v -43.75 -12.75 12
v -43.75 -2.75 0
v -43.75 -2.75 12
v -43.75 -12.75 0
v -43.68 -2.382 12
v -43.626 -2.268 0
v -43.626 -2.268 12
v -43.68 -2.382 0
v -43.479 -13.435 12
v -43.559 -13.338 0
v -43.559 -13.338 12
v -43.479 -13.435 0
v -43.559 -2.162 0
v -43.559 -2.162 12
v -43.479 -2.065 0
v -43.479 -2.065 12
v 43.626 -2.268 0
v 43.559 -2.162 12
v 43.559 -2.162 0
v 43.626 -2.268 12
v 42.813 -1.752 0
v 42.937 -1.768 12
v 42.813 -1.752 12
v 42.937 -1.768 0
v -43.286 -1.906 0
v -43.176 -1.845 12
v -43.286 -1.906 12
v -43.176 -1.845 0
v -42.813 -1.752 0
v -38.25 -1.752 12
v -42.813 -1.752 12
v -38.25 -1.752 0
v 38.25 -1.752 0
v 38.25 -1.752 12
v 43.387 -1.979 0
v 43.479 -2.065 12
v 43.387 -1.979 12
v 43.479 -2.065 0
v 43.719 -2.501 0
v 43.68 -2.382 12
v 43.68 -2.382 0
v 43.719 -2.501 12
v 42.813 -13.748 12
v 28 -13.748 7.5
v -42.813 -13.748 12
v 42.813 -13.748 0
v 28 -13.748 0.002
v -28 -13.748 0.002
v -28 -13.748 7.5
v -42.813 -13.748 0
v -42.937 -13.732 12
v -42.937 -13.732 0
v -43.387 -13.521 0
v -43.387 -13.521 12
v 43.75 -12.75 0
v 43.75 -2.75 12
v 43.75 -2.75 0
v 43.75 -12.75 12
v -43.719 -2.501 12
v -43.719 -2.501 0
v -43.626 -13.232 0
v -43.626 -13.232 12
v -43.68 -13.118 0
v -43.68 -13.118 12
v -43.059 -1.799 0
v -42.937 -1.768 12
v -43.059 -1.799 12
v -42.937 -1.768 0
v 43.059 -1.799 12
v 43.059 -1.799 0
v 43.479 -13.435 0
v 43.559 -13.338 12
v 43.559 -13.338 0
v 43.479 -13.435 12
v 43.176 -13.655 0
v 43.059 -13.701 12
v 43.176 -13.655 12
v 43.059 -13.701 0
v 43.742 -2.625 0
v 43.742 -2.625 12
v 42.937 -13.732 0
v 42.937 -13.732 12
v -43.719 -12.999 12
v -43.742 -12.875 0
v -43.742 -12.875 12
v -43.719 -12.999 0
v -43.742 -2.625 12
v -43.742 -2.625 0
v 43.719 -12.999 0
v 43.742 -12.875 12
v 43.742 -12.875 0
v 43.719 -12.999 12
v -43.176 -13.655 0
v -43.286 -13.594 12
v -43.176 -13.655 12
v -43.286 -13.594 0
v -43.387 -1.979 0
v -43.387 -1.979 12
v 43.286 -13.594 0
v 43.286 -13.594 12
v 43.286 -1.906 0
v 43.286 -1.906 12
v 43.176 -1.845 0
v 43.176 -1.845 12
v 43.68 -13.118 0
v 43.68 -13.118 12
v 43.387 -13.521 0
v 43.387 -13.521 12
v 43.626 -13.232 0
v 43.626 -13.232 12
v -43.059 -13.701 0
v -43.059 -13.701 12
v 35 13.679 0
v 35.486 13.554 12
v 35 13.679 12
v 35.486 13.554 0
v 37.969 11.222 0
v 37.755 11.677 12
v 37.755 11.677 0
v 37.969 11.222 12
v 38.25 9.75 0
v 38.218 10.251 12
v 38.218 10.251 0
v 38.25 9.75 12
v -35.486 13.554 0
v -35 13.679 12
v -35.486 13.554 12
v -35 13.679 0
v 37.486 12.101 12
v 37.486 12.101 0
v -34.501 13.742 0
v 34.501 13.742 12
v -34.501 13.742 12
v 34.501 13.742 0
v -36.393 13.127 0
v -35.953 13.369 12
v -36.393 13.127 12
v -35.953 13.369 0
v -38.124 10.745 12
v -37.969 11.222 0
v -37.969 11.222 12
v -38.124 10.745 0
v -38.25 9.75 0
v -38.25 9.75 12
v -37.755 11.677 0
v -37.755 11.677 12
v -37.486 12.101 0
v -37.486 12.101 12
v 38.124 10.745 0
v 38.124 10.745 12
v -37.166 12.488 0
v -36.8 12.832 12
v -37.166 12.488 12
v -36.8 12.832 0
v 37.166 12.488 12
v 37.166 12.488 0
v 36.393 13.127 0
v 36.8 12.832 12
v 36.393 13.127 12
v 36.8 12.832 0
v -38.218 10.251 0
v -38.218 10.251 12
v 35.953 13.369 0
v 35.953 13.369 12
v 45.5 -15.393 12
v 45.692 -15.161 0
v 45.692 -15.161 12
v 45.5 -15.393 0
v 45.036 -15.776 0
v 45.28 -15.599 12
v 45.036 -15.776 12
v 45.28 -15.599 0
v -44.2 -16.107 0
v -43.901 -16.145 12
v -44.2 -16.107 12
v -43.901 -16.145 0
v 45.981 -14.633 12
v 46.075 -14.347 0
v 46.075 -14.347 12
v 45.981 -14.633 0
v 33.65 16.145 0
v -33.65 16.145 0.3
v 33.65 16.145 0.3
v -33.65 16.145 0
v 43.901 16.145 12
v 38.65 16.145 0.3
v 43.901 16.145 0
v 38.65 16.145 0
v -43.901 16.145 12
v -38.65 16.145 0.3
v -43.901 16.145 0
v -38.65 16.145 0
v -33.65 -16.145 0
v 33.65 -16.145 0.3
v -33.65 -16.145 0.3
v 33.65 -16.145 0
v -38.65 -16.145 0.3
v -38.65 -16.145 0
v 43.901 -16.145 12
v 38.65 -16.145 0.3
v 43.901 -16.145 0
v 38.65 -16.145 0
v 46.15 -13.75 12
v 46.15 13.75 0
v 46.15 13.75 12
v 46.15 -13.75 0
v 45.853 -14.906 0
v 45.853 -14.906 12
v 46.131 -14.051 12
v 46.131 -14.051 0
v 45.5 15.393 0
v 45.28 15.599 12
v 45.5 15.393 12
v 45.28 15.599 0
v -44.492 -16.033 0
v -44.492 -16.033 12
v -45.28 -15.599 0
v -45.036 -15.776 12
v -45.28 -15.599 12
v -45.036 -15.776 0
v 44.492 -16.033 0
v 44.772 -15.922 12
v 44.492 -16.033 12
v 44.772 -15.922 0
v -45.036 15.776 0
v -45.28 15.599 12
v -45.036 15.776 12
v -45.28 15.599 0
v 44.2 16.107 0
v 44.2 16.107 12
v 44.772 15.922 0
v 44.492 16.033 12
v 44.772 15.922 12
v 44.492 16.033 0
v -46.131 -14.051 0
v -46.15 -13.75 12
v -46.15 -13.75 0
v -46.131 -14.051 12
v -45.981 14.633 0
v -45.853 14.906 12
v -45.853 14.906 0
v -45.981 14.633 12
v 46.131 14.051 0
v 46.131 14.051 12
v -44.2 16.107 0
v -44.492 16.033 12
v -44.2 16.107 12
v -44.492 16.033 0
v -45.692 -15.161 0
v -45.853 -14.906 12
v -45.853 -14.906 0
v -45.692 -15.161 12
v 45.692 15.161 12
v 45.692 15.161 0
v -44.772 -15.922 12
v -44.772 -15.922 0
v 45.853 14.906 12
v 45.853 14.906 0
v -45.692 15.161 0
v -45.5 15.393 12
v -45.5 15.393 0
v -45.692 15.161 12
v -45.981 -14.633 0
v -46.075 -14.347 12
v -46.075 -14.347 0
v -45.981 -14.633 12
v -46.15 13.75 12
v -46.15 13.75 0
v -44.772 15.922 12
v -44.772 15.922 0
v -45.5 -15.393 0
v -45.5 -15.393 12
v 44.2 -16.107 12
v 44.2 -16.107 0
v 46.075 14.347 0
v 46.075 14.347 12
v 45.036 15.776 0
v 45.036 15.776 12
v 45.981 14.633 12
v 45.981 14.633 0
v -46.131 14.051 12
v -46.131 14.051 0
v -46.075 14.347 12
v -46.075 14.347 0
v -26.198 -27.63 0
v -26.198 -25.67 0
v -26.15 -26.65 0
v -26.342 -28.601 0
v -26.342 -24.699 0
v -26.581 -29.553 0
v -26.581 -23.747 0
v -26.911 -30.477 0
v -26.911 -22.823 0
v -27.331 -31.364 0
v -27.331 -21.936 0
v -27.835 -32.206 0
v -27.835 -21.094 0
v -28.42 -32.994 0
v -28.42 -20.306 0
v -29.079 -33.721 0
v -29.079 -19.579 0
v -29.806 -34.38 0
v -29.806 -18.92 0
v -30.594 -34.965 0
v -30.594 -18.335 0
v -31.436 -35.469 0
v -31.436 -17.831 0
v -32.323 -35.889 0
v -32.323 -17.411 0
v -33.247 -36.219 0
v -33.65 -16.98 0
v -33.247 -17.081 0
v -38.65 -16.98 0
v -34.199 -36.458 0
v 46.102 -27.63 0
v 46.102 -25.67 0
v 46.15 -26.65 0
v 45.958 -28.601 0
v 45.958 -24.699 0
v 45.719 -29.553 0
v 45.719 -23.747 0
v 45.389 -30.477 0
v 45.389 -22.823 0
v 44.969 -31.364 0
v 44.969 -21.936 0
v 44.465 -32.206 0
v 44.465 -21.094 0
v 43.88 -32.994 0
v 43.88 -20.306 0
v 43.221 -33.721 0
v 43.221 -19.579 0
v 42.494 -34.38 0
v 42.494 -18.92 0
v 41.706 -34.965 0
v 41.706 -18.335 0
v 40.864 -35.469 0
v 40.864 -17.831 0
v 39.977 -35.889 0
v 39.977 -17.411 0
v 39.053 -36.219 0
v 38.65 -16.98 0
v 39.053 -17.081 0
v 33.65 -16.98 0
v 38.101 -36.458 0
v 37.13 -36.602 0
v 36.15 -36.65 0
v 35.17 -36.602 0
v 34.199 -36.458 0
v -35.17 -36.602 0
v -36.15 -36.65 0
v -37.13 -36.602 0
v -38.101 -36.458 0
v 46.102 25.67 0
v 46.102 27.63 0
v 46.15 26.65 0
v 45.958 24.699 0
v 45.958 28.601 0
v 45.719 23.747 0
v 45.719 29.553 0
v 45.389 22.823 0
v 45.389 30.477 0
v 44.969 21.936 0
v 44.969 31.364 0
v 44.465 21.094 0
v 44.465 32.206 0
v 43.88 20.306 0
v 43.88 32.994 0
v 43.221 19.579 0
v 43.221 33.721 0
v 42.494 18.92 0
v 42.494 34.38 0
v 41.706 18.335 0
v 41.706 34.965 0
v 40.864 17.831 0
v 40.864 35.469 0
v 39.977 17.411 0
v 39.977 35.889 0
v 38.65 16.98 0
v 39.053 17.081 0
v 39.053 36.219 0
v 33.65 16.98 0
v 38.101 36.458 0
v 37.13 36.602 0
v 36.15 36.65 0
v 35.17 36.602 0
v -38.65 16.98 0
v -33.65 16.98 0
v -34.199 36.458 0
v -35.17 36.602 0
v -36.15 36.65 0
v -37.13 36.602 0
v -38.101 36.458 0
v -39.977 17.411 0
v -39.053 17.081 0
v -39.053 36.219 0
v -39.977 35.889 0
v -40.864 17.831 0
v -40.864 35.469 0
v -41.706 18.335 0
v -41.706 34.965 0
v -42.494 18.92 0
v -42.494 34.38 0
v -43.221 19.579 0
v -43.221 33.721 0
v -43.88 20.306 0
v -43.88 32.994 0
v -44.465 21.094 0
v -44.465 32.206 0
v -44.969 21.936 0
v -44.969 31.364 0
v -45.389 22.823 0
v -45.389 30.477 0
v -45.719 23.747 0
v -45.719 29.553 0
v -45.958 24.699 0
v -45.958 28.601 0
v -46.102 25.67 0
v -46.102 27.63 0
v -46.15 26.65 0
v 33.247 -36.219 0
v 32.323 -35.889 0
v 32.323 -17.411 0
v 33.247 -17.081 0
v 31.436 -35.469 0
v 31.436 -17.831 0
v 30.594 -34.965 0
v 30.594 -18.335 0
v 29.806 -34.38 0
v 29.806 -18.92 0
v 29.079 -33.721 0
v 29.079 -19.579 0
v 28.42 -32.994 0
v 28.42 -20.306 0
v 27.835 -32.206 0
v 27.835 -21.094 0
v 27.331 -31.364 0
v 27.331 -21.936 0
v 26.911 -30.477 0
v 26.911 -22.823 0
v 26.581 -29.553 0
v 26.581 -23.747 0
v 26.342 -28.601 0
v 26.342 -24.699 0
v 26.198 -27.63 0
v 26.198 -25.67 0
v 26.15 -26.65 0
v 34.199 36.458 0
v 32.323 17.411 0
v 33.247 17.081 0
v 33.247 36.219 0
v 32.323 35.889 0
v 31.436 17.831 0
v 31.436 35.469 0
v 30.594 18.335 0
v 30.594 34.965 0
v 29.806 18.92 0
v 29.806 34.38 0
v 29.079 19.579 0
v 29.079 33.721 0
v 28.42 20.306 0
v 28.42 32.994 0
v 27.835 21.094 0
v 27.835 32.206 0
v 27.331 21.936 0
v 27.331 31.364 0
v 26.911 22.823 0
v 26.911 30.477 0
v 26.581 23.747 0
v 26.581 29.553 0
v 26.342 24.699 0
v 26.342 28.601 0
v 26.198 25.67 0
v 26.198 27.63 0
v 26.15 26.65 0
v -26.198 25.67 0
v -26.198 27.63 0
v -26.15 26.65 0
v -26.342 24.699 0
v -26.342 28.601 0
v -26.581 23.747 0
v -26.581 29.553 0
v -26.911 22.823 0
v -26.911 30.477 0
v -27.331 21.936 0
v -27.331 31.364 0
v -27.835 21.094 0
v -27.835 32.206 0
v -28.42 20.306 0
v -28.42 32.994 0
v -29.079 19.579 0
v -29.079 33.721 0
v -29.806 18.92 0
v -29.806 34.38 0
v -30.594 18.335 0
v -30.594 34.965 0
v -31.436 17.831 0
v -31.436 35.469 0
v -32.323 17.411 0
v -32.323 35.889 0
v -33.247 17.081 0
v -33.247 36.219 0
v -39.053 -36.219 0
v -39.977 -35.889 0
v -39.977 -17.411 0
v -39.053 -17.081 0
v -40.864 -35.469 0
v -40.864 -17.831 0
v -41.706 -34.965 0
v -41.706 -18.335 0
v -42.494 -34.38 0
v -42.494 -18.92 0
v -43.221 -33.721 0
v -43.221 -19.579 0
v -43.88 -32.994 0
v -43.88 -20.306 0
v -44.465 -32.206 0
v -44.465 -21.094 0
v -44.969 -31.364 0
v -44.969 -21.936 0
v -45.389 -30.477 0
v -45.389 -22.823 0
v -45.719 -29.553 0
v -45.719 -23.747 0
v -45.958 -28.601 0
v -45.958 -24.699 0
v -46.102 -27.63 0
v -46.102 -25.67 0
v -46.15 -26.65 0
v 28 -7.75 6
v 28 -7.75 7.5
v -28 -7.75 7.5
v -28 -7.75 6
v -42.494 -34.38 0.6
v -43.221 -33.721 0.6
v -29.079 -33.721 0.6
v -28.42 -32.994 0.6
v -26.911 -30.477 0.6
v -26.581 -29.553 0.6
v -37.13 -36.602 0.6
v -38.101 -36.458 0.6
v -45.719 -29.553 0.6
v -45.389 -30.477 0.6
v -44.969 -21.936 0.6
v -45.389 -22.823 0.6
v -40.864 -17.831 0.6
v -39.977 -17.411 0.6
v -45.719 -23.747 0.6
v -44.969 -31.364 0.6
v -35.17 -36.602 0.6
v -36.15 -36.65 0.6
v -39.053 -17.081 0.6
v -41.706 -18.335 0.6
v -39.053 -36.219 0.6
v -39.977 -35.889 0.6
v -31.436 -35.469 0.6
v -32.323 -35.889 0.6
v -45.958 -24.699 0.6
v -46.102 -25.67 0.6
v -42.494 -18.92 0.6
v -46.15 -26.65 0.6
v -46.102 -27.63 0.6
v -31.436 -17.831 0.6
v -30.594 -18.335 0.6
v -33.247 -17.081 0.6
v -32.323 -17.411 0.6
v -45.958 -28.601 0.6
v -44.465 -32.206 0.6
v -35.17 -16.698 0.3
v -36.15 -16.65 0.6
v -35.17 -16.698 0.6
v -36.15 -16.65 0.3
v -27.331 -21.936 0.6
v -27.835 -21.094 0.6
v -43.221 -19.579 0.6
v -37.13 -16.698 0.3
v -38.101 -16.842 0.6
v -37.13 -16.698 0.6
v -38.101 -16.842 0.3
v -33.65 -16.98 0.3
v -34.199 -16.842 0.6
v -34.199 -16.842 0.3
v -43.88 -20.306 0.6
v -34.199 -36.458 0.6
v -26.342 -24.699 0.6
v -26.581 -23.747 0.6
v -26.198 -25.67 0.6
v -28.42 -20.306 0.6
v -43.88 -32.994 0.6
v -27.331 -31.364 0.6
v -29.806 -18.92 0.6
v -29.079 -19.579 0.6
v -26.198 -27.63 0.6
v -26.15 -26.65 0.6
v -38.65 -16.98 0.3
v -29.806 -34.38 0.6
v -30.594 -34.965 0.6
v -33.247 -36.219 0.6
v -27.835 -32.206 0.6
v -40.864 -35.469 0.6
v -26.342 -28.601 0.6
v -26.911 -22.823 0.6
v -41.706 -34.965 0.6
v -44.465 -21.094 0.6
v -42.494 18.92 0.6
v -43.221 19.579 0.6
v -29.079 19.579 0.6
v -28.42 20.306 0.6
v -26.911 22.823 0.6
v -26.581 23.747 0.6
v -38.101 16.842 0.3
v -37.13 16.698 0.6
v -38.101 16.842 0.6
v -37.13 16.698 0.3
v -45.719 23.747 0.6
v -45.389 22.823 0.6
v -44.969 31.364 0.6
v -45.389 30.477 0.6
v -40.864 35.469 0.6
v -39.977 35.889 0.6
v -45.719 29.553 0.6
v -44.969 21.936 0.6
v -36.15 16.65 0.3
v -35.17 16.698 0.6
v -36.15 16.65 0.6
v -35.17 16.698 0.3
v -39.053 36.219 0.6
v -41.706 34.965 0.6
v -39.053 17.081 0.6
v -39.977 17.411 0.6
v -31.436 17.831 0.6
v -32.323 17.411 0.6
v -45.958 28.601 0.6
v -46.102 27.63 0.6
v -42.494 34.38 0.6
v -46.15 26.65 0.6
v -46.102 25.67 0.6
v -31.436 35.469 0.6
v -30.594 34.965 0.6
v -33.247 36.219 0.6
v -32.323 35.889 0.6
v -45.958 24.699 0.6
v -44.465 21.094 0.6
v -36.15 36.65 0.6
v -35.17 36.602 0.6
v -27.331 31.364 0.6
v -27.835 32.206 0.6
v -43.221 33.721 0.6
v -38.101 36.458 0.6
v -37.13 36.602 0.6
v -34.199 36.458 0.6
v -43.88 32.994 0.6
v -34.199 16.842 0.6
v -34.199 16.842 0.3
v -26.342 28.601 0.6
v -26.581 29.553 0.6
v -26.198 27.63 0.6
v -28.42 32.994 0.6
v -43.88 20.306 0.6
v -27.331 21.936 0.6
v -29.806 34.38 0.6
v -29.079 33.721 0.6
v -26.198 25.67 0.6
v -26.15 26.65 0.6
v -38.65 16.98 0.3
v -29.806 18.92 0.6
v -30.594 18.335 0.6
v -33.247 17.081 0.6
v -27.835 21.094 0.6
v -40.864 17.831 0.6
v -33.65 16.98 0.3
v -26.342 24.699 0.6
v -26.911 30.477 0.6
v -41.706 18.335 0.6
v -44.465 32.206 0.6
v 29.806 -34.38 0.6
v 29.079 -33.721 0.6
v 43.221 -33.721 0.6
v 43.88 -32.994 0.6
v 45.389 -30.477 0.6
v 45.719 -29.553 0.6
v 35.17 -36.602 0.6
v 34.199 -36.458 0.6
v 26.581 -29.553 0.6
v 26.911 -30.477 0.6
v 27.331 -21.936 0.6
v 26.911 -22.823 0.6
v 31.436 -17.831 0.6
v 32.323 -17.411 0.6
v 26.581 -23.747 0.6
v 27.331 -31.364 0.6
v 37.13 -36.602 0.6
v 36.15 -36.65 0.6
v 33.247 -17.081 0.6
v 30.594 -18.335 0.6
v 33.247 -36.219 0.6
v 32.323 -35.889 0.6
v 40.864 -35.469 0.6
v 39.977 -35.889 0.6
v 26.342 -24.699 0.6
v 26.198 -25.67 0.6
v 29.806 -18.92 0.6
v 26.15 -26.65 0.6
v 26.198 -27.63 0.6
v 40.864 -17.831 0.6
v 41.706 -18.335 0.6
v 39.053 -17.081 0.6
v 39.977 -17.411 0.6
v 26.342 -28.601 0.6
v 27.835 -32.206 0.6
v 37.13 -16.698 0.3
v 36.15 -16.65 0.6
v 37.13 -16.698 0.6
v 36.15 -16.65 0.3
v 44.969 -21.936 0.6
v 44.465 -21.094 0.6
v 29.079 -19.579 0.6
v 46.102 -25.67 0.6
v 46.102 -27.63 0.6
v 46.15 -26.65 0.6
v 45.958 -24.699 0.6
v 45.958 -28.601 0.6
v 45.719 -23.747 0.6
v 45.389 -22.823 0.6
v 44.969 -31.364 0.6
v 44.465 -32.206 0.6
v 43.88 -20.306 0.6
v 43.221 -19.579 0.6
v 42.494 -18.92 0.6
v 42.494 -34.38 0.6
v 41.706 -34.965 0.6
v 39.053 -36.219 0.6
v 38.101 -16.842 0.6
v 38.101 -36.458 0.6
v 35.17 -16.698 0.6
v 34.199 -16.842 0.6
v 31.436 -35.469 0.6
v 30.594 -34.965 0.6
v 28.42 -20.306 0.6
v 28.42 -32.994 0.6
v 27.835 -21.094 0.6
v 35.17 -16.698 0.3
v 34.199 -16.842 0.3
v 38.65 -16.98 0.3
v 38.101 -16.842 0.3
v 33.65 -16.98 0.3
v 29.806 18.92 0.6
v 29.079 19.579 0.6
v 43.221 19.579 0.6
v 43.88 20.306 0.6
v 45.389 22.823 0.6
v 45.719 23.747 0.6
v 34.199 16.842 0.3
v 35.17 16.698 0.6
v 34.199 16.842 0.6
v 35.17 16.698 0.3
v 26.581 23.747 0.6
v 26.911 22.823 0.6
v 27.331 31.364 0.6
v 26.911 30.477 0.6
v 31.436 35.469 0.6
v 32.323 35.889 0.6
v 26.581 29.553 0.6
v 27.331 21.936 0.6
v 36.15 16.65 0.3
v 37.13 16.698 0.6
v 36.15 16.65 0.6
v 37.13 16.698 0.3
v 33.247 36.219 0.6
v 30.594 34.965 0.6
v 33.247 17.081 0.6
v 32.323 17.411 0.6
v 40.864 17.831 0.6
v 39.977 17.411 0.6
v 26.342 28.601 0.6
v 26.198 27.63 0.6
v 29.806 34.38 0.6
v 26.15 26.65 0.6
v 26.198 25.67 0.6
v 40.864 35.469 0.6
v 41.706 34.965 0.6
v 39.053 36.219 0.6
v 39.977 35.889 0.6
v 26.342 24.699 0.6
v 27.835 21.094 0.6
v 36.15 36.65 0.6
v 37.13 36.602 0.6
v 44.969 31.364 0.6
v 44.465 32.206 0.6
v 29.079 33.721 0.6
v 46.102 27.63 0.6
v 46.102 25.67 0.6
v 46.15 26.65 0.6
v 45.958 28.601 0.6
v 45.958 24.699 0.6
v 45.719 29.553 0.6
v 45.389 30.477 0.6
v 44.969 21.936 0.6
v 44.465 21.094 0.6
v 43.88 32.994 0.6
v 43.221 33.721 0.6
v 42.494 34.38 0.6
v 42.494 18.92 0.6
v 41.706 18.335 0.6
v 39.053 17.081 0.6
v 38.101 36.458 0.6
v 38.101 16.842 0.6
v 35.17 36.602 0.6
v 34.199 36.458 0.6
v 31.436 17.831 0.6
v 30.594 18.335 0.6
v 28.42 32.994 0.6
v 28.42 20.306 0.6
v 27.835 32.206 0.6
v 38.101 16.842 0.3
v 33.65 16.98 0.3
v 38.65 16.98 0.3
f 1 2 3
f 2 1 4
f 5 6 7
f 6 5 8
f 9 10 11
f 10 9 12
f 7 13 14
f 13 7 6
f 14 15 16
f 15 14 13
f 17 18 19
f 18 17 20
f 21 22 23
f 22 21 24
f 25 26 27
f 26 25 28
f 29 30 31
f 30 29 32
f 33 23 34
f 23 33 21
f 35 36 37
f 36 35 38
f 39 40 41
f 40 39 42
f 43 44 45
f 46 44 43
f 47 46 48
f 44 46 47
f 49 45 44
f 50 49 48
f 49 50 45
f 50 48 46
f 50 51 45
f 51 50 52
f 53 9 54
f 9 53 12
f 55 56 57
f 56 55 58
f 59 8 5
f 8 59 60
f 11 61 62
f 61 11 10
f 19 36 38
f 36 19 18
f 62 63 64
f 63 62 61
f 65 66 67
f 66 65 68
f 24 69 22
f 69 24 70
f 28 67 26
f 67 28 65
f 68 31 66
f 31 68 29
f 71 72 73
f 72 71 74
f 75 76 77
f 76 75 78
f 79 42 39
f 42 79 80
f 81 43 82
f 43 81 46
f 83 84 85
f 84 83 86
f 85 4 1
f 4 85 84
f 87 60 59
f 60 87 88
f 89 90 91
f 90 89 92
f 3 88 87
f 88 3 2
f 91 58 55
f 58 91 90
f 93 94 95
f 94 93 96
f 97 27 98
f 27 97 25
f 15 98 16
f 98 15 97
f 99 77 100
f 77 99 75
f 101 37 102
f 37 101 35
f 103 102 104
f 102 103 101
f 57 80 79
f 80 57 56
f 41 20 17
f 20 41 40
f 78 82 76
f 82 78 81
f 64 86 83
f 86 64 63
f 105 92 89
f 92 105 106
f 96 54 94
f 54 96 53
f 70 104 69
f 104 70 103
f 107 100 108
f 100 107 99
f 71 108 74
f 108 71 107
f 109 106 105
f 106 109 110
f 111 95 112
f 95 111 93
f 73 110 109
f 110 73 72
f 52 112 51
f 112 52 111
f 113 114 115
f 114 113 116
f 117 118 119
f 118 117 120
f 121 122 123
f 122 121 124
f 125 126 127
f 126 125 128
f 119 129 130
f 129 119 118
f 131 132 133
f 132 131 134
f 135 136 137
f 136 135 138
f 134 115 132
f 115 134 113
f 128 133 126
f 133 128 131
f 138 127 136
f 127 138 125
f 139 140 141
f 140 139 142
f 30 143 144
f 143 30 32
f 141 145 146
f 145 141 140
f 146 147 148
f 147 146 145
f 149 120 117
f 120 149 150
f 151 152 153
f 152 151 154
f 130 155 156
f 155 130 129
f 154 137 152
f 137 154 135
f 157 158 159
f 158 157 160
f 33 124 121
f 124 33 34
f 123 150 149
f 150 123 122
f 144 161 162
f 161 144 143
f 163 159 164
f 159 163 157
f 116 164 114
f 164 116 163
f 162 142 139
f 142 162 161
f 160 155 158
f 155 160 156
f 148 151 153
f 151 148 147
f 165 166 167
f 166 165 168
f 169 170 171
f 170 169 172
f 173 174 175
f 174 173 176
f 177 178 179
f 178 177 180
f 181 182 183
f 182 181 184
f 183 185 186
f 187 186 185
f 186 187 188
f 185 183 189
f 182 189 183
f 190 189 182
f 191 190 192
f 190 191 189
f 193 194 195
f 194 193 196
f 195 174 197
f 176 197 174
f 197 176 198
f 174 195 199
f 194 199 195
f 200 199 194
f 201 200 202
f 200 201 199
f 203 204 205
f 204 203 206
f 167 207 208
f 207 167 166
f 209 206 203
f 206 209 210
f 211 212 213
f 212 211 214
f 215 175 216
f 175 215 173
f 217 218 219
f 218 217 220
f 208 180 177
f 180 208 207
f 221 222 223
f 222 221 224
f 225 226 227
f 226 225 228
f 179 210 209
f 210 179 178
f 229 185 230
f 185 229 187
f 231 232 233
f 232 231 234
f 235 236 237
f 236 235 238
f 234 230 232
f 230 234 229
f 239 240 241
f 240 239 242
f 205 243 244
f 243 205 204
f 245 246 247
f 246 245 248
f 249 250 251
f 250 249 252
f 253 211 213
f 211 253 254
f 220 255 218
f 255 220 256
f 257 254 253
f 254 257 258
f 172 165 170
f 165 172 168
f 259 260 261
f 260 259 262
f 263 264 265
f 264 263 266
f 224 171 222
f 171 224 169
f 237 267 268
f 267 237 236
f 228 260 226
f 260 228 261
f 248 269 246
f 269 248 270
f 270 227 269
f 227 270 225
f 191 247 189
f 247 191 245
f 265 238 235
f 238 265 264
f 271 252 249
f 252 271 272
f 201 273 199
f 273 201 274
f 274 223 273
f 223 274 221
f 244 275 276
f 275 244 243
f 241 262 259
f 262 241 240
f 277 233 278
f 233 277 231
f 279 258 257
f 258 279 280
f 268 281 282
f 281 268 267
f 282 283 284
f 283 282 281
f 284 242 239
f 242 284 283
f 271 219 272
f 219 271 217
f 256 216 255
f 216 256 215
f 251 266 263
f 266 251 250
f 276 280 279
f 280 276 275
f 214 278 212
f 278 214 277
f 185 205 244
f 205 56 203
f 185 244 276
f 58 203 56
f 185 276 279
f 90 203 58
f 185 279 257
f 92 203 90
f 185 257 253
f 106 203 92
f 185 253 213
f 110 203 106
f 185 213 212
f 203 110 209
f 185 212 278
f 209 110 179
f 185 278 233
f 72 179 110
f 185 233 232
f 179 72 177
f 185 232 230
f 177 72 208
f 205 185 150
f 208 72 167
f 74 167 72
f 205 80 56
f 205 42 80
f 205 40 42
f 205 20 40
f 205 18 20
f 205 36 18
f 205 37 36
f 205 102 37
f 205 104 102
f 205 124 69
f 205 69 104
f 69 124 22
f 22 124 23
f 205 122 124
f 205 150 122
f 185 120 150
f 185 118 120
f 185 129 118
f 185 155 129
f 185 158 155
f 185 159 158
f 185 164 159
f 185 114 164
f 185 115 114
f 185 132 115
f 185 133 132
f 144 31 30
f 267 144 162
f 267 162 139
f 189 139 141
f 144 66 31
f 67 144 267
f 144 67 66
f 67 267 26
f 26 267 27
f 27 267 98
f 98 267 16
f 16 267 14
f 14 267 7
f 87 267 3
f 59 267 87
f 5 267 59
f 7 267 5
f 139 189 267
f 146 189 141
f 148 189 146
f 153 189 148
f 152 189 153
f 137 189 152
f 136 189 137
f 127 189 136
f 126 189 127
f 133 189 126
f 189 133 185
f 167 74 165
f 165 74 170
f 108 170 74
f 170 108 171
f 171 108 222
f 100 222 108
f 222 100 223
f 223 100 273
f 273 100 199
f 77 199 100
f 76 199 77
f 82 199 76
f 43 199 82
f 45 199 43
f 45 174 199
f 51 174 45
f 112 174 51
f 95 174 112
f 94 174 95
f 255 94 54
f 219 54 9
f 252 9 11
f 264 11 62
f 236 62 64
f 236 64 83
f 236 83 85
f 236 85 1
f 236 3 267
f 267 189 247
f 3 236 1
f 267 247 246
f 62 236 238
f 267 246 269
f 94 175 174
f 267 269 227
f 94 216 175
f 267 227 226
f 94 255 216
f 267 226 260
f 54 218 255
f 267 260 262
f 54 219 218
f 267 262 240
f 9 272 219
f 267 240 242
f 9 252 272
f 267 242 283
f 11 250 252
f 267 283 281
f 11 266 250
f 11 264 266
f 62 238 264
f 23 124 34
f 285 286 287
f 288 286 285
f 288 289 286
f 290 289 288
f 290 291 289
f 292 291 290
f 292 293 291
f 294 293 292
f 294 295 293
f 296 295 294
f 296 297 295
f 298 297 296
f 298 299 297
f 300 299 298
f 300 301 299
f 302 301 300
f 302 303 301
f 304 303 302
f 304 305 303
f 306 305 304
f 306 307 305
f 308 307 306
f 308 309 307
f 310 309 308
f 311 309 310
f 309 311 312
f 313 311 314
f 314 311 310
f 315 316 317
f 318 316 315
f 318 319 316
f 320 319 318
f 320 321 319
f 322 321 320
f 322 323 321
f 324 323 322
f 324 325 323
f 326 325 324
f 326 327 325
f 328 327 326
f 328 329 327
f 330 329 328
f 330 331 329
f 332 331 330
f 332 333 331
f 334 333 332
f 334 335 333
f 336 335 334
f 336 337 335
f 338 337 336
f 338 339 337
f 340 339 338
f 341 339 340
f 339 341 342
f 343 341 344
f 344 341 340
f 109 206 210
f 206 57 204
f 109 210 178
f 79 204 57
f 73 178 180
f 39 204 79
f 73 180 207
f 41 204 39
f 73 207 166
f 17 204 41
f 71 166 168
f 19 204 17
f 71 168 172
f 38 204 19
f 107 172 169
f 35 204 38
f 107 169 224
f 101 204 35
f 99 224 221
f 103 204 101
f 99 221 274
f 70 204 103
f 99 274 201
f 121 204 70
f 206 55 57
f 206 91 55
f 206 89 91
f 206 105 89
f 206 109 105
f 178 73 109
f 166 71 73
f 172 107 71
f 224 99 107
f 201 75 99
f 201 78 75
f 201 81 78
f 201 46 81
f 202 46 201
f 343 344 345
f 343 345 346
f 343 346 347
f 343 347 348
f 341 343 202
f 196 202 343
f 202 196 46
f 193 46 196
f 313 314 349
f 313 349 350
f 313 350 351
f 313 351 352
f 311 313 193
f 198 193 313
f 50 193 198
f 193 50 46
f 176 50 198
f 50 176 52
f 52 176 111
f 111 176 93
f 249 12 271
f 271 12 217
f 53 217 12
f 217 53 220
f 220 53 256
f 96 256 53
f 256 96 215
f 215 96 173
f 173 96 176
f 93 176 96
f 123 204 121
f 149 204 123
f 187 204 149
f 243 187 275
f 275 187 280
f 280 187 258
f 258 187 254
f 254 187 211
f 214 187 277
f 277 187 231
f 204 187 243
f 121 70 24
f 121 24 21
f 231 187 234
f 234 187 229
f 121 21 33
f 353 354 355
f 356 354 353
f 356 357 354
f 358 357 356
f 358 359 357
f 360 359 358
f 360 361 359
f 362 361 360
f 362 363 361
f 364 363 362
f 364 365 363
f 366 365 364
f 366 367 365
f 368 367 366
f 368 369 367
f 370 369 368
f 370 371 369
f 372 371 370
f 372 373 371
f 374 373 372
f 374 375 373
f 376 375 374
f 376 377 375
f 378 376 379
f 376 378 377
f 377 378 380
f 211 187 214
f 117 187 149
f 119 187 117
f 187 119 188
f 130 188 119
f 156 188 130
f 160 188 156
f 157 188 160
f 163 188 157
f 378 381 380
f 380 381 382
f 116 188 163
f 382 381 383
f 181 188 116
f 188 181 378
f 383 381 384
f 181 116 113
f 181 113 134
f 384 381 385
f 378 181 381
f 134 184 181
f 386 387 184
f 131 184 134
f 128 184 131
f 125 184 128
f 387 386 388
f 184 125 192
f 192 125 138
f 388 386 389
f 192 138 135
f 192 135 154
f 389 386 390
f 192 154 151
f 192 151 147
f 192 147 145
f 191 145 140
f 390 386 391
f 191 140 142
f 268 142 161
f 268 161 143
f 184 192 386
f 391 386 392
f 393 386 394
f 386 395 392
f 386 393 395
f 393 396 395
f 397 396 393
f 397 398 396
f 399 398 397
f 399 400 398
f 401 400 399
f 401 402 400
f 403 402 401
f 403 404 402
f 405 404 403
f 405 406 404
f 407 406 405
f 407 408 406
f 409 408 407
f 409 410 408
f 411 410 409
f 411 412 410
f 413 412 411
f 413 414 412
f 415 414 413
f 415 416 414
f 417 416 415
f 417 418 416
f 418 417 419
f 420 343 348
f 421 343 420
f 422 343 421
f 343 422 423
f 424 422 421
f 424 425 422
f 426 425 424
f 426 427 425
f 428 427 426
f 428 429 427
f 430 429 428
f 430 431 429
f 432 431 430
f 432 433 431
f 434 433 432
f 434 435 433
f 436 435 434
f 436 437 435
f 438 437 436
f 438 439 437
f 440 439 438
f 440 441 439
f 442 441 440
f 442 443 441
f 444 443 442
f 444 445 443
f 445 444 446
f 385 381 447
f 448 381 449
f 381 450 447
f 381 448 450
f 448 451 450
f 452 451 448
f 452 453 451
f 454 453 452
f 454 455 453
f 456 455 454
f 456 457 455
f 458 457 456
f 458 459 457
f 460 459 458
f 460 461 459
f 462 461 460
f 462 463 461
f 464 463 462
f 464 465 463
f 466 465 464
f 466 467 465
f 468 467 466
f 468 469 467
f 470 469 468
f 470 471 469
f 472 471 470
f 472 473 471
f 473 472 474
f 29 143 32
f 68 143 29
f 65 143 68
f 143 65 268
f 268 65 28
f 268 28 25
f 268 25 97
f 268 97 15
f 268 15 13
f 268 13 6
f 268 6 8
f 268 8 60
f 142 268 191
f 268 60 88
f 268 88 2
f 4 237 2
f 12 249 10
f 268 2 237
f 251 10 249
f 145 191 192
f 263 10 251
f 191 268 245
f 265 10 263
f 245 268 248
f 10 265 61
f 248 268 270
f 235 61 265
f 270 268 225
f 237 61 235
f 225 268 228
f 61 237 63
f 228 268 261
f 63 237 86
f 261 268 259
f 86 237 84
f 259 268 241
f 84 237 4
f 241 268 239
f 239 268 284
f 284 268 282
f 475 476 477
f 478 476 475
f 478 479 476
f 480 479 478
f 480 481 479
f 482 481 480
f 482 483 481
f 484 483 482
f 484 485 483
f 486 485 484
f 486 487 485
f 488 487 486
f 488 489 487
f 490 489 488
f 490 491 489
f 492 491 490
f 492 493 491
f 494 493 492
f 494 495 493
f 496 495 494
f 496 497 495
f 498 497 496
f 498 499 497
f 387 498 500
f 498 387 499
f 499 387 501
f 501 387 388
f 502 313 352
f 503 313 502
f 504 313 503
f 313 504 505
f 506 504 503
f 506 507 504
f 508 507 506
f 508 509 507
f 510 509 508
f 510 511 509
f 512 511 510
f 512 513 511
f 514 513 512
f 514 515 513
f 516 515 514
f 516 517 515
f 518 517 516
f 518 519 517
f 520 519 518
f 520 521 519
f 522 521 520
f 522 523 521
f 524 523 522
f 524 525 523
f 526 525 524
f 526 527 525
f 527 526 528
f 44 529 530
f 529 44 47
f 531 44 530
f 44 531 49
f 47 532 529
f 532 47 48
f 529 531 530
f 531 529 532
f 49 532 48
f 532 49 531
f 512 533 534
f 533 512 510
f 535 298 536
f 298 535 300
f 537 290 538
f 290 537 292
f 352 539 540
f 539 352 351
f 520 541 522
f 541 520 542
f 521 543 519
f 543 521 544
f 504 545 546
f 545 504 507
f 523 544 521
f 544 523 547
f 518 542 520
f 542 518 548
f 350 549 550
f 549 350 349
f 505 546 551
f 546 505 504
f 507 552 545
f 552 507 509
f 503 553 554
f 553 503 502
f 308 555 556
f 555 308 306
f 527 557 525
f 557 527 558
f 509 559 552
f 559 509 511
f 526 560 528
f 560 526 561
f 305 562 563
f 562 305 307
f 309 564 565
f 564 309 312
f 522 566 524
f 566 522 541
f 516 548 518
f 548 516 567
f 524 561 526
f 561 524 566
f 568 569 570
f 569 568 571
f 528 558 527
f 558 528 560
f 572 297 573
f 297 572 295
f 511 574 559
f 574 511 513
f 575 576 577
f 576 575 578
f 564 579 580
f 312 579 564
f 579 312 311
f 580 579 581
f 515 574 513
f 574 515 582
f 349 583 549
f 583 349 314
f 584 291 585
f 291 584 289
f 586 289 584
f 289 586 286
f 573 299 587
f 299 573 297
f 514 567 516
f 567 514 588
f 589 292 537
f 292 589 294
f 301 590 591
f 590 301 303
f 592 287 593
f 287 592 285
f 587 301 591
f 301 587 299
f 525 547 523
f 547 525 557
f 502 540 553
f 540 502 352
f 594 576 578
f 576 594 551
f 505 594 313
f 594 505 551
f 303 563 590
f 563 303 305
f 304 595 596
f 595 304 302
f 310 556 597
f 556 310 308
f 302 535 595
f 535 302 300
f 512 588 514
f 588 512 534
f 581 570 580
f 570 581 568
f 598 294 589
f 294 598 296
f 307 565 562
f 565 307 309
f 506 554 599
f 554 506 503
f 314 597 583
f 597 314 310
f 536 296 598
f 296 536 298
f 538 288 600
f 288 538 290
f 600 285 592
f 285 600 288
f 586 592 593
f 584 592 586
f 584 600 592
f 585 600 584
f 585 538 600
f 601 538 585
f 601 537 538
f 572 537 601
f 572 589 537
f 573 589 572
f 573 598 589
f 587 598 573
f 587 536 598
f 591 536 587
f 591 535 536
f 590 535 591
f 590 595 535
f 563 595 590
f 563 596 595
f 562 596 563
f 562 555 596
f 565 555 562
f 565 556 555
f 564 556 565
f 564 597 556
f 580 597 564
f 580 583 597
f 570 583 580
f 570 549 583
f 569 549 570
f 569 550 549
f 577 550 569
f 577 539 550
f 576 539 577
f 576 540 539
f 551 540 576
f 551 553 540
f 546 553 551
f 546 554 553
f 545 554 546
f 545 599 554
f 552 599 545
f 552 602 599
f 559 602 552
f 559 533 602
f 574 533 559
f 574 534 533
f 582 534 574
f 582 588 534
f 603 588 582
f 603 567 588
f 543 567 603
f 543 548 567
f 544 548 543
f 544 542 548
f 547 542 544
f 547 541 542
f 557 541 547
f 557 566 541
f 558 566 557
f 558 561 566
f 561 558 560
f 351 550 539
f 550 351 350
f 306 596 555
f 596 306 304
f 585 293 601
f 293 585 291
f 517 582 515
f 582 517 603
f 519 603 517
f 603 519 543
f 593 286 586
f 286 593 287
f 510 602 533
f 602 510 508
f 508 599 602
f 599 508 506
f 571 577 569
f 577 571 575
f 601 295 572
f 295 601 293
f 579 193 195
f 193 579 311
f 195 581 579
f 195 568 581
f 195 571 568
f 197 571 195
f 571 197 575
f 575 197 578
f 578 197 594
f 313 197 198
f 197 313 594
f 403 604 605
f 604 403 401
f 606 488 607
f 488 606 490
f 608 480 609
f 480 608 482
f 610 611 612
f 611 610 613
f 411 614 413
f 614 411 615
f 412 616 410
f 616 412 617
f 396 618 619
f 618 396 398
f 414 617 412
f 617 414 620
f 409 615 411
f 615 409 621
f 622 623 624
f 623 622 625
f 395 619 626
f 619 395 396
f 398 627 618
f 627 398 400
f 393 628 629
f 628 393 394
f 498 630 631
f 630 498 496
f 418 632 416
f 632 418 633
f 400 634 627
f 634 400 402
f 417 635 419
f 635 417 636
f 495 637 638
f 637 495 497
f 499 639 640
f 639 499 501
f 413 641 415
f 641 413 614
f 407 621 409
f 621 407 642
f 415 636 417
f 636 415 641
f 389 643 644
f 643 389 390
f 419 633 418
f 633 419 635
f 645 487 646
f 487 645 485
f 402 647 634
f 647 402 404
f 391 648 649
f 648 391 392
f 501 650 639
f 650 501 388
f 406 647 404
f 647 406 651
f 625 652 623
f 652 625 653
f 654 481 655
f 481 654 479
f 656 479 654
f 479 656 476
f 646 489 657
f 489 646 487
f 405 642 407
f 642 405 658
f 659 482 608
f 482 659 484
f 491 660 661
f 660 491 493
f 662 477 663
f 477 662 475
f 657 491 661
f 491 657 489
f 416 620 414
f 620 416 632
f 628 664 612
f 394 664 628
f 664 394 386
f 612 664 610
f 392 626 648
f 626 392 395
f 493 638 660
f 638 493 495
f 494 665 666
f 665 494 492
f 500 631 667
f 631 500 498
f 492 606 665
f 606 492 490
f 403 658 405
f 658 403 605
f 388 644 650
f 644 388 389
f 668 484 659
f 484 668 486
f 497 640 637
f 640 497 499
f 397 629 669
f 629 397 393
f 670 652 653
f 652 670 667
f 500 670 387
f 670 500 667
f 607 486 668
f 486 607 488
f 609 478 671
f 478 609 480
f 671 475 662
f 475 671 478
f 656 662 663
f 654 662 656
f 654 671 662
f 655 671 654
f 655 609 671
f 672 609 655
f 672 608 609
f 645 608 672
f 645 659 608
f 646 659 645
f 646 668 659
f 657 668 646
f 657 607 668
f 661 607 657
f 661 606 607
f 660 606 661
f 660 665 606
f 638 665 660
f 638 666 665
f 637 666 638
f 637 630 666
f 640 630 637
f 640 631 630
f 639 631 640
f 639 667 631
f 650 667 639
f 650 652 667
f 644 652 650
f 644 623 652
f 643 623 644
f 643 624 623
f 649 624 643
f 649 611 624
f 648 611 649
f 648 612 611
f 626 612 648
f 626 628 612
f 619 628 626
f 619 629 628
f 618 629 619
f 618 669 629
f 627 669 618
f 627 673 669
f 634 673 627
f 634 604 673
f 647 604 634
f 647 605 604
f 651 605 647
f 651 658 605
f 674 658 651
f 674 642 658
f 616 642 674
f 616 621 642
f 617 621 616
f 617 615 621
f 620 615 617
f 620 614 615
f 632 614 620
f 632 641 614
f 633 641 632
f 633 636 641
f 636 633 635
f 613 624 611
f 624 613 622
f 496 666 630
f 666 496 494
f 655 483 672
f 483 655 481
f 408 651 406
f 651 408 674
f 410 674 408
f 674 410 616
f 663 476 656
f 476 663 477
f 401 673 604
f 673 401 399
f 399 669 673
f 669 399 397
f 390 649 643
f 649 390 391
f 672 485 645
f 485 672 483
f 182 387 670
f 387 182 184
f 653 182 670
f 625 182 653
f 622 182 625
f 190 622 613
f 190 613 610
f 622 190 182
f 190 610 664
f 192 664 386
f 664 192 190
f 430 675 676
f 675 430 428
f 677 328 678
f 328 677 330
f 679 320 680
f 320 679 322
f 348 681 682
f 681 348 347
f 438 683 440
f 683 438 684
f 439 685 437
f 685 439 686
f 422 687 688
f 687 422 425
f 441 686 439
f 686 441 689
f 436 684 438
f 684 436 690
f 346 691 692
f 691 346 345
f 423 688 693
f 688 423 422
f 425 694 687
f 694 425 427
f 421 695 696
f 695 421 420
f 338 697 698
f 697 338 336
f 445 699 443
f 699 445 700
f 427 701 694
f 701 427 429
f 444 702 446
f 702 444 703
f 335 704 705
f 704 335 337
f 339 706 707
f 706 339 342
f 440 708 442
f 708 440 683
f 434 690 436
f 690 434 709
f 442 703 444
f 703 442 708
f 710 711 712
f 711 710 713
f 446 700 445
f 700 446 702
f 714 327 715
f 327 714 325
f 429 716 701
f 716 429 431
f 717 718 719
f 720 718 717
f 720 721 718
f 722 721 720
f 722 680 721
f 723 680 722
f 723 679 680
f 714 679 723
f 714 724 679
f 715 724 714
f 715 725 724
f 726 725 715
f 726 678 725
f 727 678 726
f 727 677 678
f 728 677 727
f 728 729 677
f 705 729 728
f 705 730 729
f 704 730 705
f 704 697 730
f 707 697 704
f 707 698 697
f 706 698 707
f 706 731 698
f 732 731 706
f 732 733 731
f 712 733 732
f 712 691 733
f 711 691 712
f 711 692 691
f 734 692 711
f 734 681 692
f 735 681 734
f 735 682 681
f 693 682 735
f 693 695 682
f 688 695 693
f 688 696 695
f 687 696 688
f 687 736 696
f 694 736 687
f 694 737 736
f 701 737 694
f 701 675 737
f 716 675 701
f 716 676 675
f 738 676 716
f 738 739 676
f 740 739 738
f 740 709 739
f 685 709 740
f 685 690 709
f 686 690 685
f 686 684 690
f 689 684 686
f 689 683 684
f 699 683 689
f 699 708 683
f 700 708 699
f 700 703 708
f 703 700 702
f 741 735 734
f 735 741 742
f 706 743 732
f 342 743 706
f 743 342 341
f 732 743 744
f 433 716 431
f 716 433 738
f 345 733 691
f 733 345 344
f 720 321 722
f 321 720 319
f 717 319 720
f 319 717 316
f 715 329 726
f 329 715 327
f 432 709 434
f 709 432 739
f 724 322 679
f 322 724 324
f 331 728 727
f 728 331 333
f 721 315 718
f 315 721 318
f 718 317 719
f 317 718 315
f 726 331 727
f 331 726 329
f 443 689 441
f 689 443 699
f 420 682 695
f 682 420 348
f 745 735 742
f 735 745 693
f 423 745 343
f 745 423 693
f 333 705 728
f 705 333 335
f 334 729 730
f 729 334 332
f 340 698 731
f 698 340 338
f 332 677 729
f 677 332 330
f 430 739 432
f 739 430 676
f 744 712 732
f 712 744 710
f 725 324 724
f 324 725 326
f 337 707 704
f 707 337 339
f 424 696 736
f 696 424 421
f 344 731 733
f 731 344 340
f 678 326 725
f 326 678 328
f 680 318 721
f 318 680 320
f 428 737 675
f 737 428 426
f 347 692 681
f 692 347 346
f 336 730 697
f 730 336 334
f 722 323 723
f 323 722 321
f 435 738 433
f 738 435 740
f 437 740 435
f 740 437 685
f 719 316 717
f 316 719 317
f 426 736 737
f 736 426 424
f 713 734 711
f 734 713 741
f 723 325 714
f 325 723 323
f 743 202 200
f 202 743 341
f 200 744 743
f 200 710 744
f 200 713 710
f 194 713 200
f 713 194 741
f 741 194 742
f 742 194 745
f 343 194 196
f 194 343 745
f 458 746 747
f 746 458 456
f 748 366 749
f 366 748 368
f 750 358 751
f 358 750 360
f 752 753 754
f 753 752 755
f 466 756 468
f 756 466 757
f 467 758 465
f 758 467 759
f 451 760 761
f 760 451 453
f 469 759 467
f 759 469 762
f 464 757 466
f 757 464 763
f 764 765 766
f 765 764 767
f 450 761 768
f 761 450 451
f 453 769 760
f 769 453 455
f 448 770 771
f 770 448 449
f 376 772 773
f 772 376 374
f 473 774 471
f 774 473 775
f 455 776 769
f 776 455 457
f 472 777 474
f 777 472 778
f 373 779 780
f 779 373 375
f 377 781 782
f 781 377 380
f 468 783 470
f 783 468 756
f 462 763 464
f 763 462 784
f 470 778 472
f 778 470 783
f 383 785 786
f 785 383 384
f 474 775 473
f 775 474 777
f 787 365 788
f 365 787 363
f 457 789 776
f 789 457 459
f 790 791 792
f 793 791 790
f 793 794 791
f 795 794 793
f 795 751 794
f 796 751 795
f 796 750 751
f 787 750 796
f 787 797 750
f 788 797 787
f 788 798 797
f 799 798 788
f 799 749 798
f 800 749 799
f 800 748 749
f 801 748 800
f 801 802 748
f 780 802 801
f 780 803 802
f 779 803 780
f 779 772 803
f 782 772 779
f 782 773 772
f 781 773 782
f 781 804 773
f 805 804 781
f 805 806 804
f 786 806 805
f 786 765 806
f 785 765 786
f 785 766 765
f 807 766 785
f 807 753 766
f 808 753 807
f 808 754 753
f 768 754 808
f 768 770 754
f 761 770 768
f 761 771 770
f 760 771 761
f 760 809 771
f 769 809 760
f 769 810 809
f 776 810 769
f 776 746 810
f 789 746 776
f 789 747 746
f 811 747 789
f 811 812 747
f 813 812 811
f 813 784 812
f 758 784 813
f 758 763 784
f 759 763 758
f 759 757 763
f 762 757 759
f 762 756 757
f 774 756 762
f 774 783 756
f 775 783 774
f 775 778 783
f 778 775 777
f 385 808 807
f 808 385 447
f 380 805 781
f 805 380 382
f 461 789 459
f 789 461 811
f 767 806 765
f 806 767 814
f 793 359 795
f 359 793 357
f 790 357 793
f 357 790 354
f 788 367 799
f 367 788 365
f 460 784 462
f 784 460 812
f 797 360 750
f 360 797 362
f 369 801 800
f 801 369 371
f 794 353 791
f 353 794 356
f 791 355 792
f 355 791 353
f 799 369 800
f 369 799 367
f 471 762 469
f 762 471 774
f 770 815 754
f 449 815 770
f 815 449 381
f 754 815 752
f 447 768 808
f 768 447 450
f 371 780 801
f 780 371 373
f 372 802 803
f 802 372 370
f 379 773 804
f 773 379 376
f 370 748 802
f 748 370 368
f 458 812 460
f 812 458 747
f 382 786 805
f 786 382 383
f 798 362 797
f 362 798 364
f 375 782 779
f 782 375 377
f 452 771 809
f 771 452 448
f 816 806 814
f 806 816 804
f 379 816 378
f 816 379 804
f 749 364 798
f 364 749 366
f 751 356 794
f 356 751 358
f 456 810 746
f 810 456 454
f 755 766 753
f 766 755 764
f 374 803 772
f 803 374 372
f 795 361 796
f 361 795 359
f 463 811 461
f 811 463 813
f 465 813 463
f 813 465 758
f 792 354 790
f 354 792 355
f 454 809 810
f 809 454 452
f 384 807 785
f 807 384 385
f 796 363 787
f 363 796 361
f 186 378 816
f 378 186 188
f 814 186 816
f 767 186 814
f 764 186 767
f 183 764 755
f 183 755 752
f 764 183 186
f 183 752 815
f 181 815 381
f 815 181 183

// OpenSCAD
$fn = 50;

union() {
	difference() {
		union() {
			hull() {
				translate(v = [-43.75, 13.749999999999998, 0]) {
					cylinder(h = 12, r = 2.4);
				}
				translate(v = [43.75, 13.749999999999998, 0]) {
					cylinder(h = 12, r = 2.4);
				}
				translate(v = [-43.75, -13.749999999999998, 0]) {
					cylinder(h = 12, r = 2.4);
				}
				translate(v = [43.75, -13.749999999999998, 0]) {
					cylinder(h = 12, r = 2.4);
				}
			}
		}
		union() {
			translate(v = [0.0, -7.749999999999998, -0.1]) {
				hull() {
					translate(v = [-42.75, 5.0, 0]) {
						cylinder(h = 12.2, r = 1.0);
					}
					translate(v = [42.75, 5.0, 0]) {
						cylinder(h = 12.2, r = 1.0);
					}
					translate(v = [-42.75, -5.0, 0]) {
						cylinder(h = 12.2, r = 1.0);
					}
					translate(v = [42.75, -5.0, 0]) {
						cylinder(h = 12.2, r = 1.0);
					}
				}
			}
			translate(v = [0.0, 1.7763568394002505e-15, -0.1]) {
				hull() {
					translate(v = [-34.25, 9.75, 0]) {
						cylinder(h = 12.2, r = 4.0);
					}
					translate(v = [34.25, 9.75, 0]) {
						cylinder(h = 12.2, r = 4.0);
					}
					translate(v = [-34.25, -9.75, 0]) {
						cylinder(h = 12.2, r = 4.0);
					}
					translate(v = [34.25, -9.75, 0]) {
						cylinder(h = 12.2, r = 4.0);
					}
				}
			}
		}
	}
	union() {
		#translate(v = [-28.0, -13.749999999999998, 0]) {
			rotate(a = [90, 0, 90]) {
				linear_extrude(height = 56.0) {
					polygon(points = [[-1.8, 0], [0, 0], [6.0, 6.0], [6.0, 7.5], [-1.8, 7.5]]);
				}
			}
		}
		translate(v = [-36.15, -26.65, 0]) {
			linear_extrude(height = 0.6) {
				polygon(points = [[10.0, 0.0], [9.95184726672197, 0.980171403295606], [9.807852804032304, 1.9509032201612824], [9.569403357322088, 2.902846772544623], [9.238795325112868, 3.826834323650898], [8.819212643483551, 4.7139673682599765], [8.314696123025453, 5.555702330196022], [7.73010453362737, 6.343932841636455], [7.0710678118654755, 7.0710678118654755], [6.343932841636455, 7.730104533627369], [5.555702330196023, 8.314696123025453], [4.713967368259978, 8.81921264348355], [3.8268343236508984, 9.238795325112868], [2.902846772544623, 9.56940335732209], [1.9509032201612833, 9.807852804032304], [0.9801714032956077, 9.951847266721968], [6.123233995736766e-16, 10.0], [-0.9801714032956065, 9.95184726672197], [-1.950903220161282, 9.807852804032304], [-2.9028467725446214, 9.56940335732209], [-3.826834323650897, 9.238795325112868], [-4.713967368259977, 8.819212643483551], [-5.55570233019602, 8.314696123025453], [-6.3439328416364535, 7.730104533627371], [-7.071067811865475, 7.0710678118654755], [-7.73010453362737, 6.343932841636455], [-8.314696123025453, 5.555702330196022], [-8.81921264348355, 4.713967368259978], [-9.238795325112868, 3.826834323650899], [-9.569403357322088, 2.902846772544624], [-9.807852804032304, 1.9509032201612861], [-9.951847266721968, 0.9801714032956083], [-10.0, 1.2246467991473533e-15], [-9.95184726672197, -0.9801714032956059], [-9.807852804032304, -1.9509032201612837], [-9.56940335732209, -2.902846772544621], [-9.238795325112868, -3.8268343236508966], [-8.819212643483551, -4.7139673682599765], [-8.314696123025454, -5.55570233019602], [-7.730104533627371, -6.343932841636453], [-7.071067811865477, -7.071067811865475], [-6.343932841636459, -7.730104533627367], [-5.555702330196022, -8.314696123025453], [-4.713967368259978, -8.81921264348355], [-3.8268343236509033, -9.238795325112864], [-2.9028467725446245, -9.569403357322088], [-1.9509032201612866, -9.807852804032303], [-0.9801714032956045, -9.95184726672197], [-1.8369701987210296e-15, -10.0], [0.9801714032956009, -9.95184726672197], [1.950903220161283, -9.807852804032304], [2.9028467725446205, -9.56940335732209], [3.8268343236509, -9.238795325112866], [4.713967368259976, -8.819212643483551], [5.555702330196018, -8.314696123025454], [6.343932841636456, -7.730104533627369], [7.071067811865474, -7.071067811865477], [7.730104533627365, -6.343932841636459], [8.314696123025453, -5.555702330196022], [8.819212643483548, -4.713967368259979], [9.238795325112864, -3.826834323650904], [9.569403357322088, -2.902846772544625], [9.807852804032303, -1.9509032201612873], [9.95184726672197, -0.980171403295605]]);
			}
		}
		translate(v = [-38.65, -17.45, 0]) {
			cube(size = [5.0, 1.700000000000001, 0.3]);
		}
		translate(v = [-36.15, 26.65, 0]) {
			linear_extrude(height = 0.6) {
				polygon(points = [[10.0, 0.0], [9.95184726672197, 0.980171403295606], [9.807852804032304, 1.9509032201612824], [9.569403357322088, 2.902846772544623], [9.238795325112868, 3.826834323650898], [8.819212643483551, 4.7139673682599765], [8.314696123025453, 5.555702330196022], [7.73010453362737, 6.343932841636455], [7.0710678118654755, 7.0710678118654755], [6.343932841636455, 7.730104533627369], [5.555702330196023, 8.314696123025453], [4.713967368259978, 8.81921264348355], [3.8268343236508984, 9.238795325112868], [2.902846772544623, 9.56940335732209], [1.9509032201612833, 9.807852804032304], [0.9801714032956077, 9.951847266721968], [6.123233995736766e-16, 10.0], [-0.9801714032956065, 9.95184726672197], [-1.950903220161282, 9.807852804032304], [-2.9028467725446214, 9.56940335732209], [-3.826834323650897, 9.238795325112868], [-4.713967368259977, 8.819212643483551], [-5.55570233019602, 8.314696123025453], [-6.3439328416364535, 7.730104533627371], [-7.071067811865475, 7.0710678118654755], [-7.73010453362737, 6.343932841636455], [-8.314696123025453, 5.555702330196022], [-8.81921264348355, 4.713967368259978], [-9.238795325112868, 3.826834323650899], [-9.569403357322088, 2.902846772544624], [-9.807852804032304, 1.9509032201612861], [-9.951847266721968, 0.9801714032956083], [-10.0, 1.2246467991473533e-15], [-9.95184726672197, -0.9801714032956059], [-9.807852804032304, -1.9509032201612837], [-9.56940335732209, -2.902846772544621], [-9.238795325112868, -3.8268343236508966], [-8.819212643483551, -4.7139673682599765], [-8.314696123025454, -5.55570233019602], [-7.730104533627371, -6.343932841636453], [-7.071067811865477, -7.071067811865475], [-6.343932841636459, -7.730104533627367], [-5.555702330196022, -8.314696123025453], [-4.713967368259978, -8.81921264348355], [-3.8268343236509033, -9.238795325112864], [-2.9028467725446245, -9.569403357322088], [-1.9509032201612866, -9.807852804032303], [-0.9801714032956045, -9.95184726672197], [-1.8369701987210296e-15, -10.0], [0.9801714032956009, -9.95184726672197], [1.950903220161283, -9.807852804032304], [2.9028467725446205, -9.56940335732209], [3.8268343236509, -9.238795325112866], [4.713967368259976, -8.819212643483551], [5.555702330196018, -8.314696123025454], [6.343932841636456, -7.730104533627369], [7.071067811865474, -7.071067811865477], [7.730104533627365, -6.343932841636459], [8.314696123025453, -5.555702330196022], [8.819212643483548, -4.713967368259979], [9.238795325112864, -3.826834323650904], [9.569403357322088, -2.902846772544625], [9.807852804032303, -1.9509032201612873], [9.95184726672197, -0.980171403295605]]);
			}
		}
		translate(v = [-38.65, 15.749999999999998, 0]) {
			cube(size = [5.0, 1.700000000000001, 0.3]);
		}
		translate(v = [36.15, -26.65, 0]) {
			linear_extrude(height = 0.6) {
				polygon(points = [[10.0, 0.0], [9.95184726672197, 0.980171403295606], [9.807852804032304, 1.9509032201612824], [9.569403357322088, 2.902846772544623], [9.238795325112868, 3.826834323650898], [8.819212643483551, 4.7139673682599765], [8.314696123025453, 5.555702330196022], [7.73010453362737, 6.343932841636455], [7.0710678118654755, 7.0710678118654755], [6.343932841636455, 7.730104533627369], [5.555702330196023, 8.314696123025453], [4.713967368259978, 8.81921264348355], [3.8268343236508984, 9.238795325112868], [2.902846772544623, 9.56940335732209], [1.9509032201612833, 9.807852804032304], [0.9801714032956077, 9.951847266721968], [6.123233995736766e-16, 10.0], [-0.9801714032956065, 9.95184726672197], [-1.950903220161282, 9.807852804032304], [-2.9028467725446214, 9.56940335732209], [-3.826834323650897, 9.238795325112868], [-4.713967368259977, 8.819212643483551], [-5.55570233019602, 8.314696123025453], [-6.3439328416364535, 7.730104533627371], [-7.071067811865475, 7.0710678118654755], [-7.73010453362737, 6.343932841636455], [-8.314696123025453, 5.555702330196022], [-8.81921264348355, 4.713967368259978], [-9.238795325112868, 3.826834323650899], [-9.569403357322088, 2.902846772544624], [-9.807852804032304, 1.9509032201612861], [-9.951847266721968, 0.9801714032956083], [-10.0, 1.2246467991473533e-15], [-9.95184726672197, -0.9801714032956059], [-9.807852804032304, -1.9509032201612837], [-9.56940335732209, -2.902846772544621], [-9.238795325112868, -3.8268343236508966], [-8.819212643483551, -4.7139673682599765], [-8.314696123025454, -5.55570233019602], [-7.730104533627371, -6.343932841636453], [-7.071067811865477, -7.071067811865475], [-6.343932841636459, -7.730104533627367], [-5.555702330196022, -8.314696123025453], [-4.713967368259978, -8.81921264348355], [-3.8268343236509033, -9.238795325112864], [-2.9028467725446245, -9.569403357322088], [-1.9509032201612866, -9.807852804032303], [-0.9801714032956045, -9.95184726672197], [-1.8369701987210296e-15, -10.0], [0.9801714032956009, -9.95184726672197], [1.950903220161283, -9.807852804032304], [2.9028467725446205, -9.56940335732209], [3.8268343236509, -9.238795325112866], [4.713967368259976, -8.819212643483551], [5.555702330196018, -8.314696123025454], [6.343932841636456, -7.730104533627369], [7.071067811865474, -7.071067811865477], [7.730104533627365, -6.343932841636459], [8.314696123025453, -5.555702330196022], [8.819212643483548, -4.713967368259979], [9.238795325112864, -3.826834323650904], [9.569403357322088, -2.902846772544625], [9.807852804032303, -1.9509032201612873], [9.95184726672197, -0.980171403295605]]);
			}
		}
		translate(v = [33.65, -17.45, 0]) {
			cube(size = [5.0, 1.700000000000001, 0.3]);
		}
		translate(v = [36.15, 26.65, 0]) {
			linear_extrude(height = 0.6) {
				polygon(points = [[10.0, 0.0], [9.95184726672197, 0.980171403295606], [9.807852804032304, 1.9509032201612824], [9.569403357322088, 2.902846772544623], [9.238795325112868, 3.826834323650898], [8.819212643483551, 4.7139673682599765], [8.314696123025453, 5.555702330196022], [7.73010453362737, 6.343932841636455], [7.0710678118654755, 7.0710678118654755], [6.343932841636455, 7.730104533627369], [5.555702330196023, 8.314696123025453], [4.713967368259978, 8.81921264348355], [3.8268343236508984, 9.238795325112868], [2.902846772544623, 9.56940335732209], [1.9509032201612833, 9.807852804032304], [0.9801714032956077, 9.951847266721968], [6.123233995736766e-16, 10.0], [-0.9801714032956065, 9.95184726672197], [-1.950903220161282, 9.807852804032304], [-2.9028467725446214, 9.56940335732209], [-3.826834323650897, 9.238795325112868], [-4.713967368259977, 8.819212643483551], [-5.55570233019602, 8.314696123025453], [-6.3439328416364535, 7.730104533627371], [-7.071067811865475, 7.0710678118654755], [-7.73010453362737, 6.343932841636455], [-8.314696123025453, 5.555702330196022], [-8.81921264348355, 4.713967368259978], [-9.238795325112868, 3.826834323650899], [-9.569403357322088, 2.902846772544624], [-9.807852804032304, 1.9509032201612861], [-9.951847266721968, 0.9801714032956083], [-10.0, 1.2246467991473533e-15], [-9.95184726672197, -0.9801714032956059], [-9.807852804032304, -1.9509032201612837], [-9.56940335732209, -2.902846772544621], [-9.238795325112868, -3.8268343236508966], [-8.819212643483551, -4.7139673682599765], [-8.314696123025454, -5.55570233019602], [-7.730104533627371, -6.343932841636453], [-7.071067811865477, -7.071067811865475], [-6.343932841636459, -7.730104533627367], [-5.555702330196022, -8.314696123025453], [-4.713967368259978, -8.81921264348355], [-3.8268343236509033, -9.238795325112864], [-2.9028467725446245, -9.569403357322088], [-1.9509032201612866, -9.807852804032303], [-0.9801714032956045, -9.95184726672197], [-1.8369701987210296e-15, -10.0], [0.9801714032956009, -9.95184726672197], [1.950903220161283, -9.807852804032304], [2.9028467725446205, -9.56940335732209], [3.8268343236509, -9.238795325112866], [4.713967368259976, -8.819212643483551], [5.555702330196018, -8.314696123025454], [6.343932841636456, -7.730104533627369], [7.071067811865474, -7.071067811865477], [7.730104533627365, -6.343932841636459], [8.314696123025453, -5.555702330196022], [8.819212643483548, -4.713967368259979], [9.238795325112864, -3.826834323650904], [9.569403357322088, -2.902846772544625], [9.807852804032303, -1.9509032201612873], [9.95184726672197, -0.980171403295605]]);
			}
		}
		translate(v = [33.65, 15.749999999999998, 0]) {
			cube(size = [5.0, 1.700000000000001, 0.3]);
		}
	}
}
